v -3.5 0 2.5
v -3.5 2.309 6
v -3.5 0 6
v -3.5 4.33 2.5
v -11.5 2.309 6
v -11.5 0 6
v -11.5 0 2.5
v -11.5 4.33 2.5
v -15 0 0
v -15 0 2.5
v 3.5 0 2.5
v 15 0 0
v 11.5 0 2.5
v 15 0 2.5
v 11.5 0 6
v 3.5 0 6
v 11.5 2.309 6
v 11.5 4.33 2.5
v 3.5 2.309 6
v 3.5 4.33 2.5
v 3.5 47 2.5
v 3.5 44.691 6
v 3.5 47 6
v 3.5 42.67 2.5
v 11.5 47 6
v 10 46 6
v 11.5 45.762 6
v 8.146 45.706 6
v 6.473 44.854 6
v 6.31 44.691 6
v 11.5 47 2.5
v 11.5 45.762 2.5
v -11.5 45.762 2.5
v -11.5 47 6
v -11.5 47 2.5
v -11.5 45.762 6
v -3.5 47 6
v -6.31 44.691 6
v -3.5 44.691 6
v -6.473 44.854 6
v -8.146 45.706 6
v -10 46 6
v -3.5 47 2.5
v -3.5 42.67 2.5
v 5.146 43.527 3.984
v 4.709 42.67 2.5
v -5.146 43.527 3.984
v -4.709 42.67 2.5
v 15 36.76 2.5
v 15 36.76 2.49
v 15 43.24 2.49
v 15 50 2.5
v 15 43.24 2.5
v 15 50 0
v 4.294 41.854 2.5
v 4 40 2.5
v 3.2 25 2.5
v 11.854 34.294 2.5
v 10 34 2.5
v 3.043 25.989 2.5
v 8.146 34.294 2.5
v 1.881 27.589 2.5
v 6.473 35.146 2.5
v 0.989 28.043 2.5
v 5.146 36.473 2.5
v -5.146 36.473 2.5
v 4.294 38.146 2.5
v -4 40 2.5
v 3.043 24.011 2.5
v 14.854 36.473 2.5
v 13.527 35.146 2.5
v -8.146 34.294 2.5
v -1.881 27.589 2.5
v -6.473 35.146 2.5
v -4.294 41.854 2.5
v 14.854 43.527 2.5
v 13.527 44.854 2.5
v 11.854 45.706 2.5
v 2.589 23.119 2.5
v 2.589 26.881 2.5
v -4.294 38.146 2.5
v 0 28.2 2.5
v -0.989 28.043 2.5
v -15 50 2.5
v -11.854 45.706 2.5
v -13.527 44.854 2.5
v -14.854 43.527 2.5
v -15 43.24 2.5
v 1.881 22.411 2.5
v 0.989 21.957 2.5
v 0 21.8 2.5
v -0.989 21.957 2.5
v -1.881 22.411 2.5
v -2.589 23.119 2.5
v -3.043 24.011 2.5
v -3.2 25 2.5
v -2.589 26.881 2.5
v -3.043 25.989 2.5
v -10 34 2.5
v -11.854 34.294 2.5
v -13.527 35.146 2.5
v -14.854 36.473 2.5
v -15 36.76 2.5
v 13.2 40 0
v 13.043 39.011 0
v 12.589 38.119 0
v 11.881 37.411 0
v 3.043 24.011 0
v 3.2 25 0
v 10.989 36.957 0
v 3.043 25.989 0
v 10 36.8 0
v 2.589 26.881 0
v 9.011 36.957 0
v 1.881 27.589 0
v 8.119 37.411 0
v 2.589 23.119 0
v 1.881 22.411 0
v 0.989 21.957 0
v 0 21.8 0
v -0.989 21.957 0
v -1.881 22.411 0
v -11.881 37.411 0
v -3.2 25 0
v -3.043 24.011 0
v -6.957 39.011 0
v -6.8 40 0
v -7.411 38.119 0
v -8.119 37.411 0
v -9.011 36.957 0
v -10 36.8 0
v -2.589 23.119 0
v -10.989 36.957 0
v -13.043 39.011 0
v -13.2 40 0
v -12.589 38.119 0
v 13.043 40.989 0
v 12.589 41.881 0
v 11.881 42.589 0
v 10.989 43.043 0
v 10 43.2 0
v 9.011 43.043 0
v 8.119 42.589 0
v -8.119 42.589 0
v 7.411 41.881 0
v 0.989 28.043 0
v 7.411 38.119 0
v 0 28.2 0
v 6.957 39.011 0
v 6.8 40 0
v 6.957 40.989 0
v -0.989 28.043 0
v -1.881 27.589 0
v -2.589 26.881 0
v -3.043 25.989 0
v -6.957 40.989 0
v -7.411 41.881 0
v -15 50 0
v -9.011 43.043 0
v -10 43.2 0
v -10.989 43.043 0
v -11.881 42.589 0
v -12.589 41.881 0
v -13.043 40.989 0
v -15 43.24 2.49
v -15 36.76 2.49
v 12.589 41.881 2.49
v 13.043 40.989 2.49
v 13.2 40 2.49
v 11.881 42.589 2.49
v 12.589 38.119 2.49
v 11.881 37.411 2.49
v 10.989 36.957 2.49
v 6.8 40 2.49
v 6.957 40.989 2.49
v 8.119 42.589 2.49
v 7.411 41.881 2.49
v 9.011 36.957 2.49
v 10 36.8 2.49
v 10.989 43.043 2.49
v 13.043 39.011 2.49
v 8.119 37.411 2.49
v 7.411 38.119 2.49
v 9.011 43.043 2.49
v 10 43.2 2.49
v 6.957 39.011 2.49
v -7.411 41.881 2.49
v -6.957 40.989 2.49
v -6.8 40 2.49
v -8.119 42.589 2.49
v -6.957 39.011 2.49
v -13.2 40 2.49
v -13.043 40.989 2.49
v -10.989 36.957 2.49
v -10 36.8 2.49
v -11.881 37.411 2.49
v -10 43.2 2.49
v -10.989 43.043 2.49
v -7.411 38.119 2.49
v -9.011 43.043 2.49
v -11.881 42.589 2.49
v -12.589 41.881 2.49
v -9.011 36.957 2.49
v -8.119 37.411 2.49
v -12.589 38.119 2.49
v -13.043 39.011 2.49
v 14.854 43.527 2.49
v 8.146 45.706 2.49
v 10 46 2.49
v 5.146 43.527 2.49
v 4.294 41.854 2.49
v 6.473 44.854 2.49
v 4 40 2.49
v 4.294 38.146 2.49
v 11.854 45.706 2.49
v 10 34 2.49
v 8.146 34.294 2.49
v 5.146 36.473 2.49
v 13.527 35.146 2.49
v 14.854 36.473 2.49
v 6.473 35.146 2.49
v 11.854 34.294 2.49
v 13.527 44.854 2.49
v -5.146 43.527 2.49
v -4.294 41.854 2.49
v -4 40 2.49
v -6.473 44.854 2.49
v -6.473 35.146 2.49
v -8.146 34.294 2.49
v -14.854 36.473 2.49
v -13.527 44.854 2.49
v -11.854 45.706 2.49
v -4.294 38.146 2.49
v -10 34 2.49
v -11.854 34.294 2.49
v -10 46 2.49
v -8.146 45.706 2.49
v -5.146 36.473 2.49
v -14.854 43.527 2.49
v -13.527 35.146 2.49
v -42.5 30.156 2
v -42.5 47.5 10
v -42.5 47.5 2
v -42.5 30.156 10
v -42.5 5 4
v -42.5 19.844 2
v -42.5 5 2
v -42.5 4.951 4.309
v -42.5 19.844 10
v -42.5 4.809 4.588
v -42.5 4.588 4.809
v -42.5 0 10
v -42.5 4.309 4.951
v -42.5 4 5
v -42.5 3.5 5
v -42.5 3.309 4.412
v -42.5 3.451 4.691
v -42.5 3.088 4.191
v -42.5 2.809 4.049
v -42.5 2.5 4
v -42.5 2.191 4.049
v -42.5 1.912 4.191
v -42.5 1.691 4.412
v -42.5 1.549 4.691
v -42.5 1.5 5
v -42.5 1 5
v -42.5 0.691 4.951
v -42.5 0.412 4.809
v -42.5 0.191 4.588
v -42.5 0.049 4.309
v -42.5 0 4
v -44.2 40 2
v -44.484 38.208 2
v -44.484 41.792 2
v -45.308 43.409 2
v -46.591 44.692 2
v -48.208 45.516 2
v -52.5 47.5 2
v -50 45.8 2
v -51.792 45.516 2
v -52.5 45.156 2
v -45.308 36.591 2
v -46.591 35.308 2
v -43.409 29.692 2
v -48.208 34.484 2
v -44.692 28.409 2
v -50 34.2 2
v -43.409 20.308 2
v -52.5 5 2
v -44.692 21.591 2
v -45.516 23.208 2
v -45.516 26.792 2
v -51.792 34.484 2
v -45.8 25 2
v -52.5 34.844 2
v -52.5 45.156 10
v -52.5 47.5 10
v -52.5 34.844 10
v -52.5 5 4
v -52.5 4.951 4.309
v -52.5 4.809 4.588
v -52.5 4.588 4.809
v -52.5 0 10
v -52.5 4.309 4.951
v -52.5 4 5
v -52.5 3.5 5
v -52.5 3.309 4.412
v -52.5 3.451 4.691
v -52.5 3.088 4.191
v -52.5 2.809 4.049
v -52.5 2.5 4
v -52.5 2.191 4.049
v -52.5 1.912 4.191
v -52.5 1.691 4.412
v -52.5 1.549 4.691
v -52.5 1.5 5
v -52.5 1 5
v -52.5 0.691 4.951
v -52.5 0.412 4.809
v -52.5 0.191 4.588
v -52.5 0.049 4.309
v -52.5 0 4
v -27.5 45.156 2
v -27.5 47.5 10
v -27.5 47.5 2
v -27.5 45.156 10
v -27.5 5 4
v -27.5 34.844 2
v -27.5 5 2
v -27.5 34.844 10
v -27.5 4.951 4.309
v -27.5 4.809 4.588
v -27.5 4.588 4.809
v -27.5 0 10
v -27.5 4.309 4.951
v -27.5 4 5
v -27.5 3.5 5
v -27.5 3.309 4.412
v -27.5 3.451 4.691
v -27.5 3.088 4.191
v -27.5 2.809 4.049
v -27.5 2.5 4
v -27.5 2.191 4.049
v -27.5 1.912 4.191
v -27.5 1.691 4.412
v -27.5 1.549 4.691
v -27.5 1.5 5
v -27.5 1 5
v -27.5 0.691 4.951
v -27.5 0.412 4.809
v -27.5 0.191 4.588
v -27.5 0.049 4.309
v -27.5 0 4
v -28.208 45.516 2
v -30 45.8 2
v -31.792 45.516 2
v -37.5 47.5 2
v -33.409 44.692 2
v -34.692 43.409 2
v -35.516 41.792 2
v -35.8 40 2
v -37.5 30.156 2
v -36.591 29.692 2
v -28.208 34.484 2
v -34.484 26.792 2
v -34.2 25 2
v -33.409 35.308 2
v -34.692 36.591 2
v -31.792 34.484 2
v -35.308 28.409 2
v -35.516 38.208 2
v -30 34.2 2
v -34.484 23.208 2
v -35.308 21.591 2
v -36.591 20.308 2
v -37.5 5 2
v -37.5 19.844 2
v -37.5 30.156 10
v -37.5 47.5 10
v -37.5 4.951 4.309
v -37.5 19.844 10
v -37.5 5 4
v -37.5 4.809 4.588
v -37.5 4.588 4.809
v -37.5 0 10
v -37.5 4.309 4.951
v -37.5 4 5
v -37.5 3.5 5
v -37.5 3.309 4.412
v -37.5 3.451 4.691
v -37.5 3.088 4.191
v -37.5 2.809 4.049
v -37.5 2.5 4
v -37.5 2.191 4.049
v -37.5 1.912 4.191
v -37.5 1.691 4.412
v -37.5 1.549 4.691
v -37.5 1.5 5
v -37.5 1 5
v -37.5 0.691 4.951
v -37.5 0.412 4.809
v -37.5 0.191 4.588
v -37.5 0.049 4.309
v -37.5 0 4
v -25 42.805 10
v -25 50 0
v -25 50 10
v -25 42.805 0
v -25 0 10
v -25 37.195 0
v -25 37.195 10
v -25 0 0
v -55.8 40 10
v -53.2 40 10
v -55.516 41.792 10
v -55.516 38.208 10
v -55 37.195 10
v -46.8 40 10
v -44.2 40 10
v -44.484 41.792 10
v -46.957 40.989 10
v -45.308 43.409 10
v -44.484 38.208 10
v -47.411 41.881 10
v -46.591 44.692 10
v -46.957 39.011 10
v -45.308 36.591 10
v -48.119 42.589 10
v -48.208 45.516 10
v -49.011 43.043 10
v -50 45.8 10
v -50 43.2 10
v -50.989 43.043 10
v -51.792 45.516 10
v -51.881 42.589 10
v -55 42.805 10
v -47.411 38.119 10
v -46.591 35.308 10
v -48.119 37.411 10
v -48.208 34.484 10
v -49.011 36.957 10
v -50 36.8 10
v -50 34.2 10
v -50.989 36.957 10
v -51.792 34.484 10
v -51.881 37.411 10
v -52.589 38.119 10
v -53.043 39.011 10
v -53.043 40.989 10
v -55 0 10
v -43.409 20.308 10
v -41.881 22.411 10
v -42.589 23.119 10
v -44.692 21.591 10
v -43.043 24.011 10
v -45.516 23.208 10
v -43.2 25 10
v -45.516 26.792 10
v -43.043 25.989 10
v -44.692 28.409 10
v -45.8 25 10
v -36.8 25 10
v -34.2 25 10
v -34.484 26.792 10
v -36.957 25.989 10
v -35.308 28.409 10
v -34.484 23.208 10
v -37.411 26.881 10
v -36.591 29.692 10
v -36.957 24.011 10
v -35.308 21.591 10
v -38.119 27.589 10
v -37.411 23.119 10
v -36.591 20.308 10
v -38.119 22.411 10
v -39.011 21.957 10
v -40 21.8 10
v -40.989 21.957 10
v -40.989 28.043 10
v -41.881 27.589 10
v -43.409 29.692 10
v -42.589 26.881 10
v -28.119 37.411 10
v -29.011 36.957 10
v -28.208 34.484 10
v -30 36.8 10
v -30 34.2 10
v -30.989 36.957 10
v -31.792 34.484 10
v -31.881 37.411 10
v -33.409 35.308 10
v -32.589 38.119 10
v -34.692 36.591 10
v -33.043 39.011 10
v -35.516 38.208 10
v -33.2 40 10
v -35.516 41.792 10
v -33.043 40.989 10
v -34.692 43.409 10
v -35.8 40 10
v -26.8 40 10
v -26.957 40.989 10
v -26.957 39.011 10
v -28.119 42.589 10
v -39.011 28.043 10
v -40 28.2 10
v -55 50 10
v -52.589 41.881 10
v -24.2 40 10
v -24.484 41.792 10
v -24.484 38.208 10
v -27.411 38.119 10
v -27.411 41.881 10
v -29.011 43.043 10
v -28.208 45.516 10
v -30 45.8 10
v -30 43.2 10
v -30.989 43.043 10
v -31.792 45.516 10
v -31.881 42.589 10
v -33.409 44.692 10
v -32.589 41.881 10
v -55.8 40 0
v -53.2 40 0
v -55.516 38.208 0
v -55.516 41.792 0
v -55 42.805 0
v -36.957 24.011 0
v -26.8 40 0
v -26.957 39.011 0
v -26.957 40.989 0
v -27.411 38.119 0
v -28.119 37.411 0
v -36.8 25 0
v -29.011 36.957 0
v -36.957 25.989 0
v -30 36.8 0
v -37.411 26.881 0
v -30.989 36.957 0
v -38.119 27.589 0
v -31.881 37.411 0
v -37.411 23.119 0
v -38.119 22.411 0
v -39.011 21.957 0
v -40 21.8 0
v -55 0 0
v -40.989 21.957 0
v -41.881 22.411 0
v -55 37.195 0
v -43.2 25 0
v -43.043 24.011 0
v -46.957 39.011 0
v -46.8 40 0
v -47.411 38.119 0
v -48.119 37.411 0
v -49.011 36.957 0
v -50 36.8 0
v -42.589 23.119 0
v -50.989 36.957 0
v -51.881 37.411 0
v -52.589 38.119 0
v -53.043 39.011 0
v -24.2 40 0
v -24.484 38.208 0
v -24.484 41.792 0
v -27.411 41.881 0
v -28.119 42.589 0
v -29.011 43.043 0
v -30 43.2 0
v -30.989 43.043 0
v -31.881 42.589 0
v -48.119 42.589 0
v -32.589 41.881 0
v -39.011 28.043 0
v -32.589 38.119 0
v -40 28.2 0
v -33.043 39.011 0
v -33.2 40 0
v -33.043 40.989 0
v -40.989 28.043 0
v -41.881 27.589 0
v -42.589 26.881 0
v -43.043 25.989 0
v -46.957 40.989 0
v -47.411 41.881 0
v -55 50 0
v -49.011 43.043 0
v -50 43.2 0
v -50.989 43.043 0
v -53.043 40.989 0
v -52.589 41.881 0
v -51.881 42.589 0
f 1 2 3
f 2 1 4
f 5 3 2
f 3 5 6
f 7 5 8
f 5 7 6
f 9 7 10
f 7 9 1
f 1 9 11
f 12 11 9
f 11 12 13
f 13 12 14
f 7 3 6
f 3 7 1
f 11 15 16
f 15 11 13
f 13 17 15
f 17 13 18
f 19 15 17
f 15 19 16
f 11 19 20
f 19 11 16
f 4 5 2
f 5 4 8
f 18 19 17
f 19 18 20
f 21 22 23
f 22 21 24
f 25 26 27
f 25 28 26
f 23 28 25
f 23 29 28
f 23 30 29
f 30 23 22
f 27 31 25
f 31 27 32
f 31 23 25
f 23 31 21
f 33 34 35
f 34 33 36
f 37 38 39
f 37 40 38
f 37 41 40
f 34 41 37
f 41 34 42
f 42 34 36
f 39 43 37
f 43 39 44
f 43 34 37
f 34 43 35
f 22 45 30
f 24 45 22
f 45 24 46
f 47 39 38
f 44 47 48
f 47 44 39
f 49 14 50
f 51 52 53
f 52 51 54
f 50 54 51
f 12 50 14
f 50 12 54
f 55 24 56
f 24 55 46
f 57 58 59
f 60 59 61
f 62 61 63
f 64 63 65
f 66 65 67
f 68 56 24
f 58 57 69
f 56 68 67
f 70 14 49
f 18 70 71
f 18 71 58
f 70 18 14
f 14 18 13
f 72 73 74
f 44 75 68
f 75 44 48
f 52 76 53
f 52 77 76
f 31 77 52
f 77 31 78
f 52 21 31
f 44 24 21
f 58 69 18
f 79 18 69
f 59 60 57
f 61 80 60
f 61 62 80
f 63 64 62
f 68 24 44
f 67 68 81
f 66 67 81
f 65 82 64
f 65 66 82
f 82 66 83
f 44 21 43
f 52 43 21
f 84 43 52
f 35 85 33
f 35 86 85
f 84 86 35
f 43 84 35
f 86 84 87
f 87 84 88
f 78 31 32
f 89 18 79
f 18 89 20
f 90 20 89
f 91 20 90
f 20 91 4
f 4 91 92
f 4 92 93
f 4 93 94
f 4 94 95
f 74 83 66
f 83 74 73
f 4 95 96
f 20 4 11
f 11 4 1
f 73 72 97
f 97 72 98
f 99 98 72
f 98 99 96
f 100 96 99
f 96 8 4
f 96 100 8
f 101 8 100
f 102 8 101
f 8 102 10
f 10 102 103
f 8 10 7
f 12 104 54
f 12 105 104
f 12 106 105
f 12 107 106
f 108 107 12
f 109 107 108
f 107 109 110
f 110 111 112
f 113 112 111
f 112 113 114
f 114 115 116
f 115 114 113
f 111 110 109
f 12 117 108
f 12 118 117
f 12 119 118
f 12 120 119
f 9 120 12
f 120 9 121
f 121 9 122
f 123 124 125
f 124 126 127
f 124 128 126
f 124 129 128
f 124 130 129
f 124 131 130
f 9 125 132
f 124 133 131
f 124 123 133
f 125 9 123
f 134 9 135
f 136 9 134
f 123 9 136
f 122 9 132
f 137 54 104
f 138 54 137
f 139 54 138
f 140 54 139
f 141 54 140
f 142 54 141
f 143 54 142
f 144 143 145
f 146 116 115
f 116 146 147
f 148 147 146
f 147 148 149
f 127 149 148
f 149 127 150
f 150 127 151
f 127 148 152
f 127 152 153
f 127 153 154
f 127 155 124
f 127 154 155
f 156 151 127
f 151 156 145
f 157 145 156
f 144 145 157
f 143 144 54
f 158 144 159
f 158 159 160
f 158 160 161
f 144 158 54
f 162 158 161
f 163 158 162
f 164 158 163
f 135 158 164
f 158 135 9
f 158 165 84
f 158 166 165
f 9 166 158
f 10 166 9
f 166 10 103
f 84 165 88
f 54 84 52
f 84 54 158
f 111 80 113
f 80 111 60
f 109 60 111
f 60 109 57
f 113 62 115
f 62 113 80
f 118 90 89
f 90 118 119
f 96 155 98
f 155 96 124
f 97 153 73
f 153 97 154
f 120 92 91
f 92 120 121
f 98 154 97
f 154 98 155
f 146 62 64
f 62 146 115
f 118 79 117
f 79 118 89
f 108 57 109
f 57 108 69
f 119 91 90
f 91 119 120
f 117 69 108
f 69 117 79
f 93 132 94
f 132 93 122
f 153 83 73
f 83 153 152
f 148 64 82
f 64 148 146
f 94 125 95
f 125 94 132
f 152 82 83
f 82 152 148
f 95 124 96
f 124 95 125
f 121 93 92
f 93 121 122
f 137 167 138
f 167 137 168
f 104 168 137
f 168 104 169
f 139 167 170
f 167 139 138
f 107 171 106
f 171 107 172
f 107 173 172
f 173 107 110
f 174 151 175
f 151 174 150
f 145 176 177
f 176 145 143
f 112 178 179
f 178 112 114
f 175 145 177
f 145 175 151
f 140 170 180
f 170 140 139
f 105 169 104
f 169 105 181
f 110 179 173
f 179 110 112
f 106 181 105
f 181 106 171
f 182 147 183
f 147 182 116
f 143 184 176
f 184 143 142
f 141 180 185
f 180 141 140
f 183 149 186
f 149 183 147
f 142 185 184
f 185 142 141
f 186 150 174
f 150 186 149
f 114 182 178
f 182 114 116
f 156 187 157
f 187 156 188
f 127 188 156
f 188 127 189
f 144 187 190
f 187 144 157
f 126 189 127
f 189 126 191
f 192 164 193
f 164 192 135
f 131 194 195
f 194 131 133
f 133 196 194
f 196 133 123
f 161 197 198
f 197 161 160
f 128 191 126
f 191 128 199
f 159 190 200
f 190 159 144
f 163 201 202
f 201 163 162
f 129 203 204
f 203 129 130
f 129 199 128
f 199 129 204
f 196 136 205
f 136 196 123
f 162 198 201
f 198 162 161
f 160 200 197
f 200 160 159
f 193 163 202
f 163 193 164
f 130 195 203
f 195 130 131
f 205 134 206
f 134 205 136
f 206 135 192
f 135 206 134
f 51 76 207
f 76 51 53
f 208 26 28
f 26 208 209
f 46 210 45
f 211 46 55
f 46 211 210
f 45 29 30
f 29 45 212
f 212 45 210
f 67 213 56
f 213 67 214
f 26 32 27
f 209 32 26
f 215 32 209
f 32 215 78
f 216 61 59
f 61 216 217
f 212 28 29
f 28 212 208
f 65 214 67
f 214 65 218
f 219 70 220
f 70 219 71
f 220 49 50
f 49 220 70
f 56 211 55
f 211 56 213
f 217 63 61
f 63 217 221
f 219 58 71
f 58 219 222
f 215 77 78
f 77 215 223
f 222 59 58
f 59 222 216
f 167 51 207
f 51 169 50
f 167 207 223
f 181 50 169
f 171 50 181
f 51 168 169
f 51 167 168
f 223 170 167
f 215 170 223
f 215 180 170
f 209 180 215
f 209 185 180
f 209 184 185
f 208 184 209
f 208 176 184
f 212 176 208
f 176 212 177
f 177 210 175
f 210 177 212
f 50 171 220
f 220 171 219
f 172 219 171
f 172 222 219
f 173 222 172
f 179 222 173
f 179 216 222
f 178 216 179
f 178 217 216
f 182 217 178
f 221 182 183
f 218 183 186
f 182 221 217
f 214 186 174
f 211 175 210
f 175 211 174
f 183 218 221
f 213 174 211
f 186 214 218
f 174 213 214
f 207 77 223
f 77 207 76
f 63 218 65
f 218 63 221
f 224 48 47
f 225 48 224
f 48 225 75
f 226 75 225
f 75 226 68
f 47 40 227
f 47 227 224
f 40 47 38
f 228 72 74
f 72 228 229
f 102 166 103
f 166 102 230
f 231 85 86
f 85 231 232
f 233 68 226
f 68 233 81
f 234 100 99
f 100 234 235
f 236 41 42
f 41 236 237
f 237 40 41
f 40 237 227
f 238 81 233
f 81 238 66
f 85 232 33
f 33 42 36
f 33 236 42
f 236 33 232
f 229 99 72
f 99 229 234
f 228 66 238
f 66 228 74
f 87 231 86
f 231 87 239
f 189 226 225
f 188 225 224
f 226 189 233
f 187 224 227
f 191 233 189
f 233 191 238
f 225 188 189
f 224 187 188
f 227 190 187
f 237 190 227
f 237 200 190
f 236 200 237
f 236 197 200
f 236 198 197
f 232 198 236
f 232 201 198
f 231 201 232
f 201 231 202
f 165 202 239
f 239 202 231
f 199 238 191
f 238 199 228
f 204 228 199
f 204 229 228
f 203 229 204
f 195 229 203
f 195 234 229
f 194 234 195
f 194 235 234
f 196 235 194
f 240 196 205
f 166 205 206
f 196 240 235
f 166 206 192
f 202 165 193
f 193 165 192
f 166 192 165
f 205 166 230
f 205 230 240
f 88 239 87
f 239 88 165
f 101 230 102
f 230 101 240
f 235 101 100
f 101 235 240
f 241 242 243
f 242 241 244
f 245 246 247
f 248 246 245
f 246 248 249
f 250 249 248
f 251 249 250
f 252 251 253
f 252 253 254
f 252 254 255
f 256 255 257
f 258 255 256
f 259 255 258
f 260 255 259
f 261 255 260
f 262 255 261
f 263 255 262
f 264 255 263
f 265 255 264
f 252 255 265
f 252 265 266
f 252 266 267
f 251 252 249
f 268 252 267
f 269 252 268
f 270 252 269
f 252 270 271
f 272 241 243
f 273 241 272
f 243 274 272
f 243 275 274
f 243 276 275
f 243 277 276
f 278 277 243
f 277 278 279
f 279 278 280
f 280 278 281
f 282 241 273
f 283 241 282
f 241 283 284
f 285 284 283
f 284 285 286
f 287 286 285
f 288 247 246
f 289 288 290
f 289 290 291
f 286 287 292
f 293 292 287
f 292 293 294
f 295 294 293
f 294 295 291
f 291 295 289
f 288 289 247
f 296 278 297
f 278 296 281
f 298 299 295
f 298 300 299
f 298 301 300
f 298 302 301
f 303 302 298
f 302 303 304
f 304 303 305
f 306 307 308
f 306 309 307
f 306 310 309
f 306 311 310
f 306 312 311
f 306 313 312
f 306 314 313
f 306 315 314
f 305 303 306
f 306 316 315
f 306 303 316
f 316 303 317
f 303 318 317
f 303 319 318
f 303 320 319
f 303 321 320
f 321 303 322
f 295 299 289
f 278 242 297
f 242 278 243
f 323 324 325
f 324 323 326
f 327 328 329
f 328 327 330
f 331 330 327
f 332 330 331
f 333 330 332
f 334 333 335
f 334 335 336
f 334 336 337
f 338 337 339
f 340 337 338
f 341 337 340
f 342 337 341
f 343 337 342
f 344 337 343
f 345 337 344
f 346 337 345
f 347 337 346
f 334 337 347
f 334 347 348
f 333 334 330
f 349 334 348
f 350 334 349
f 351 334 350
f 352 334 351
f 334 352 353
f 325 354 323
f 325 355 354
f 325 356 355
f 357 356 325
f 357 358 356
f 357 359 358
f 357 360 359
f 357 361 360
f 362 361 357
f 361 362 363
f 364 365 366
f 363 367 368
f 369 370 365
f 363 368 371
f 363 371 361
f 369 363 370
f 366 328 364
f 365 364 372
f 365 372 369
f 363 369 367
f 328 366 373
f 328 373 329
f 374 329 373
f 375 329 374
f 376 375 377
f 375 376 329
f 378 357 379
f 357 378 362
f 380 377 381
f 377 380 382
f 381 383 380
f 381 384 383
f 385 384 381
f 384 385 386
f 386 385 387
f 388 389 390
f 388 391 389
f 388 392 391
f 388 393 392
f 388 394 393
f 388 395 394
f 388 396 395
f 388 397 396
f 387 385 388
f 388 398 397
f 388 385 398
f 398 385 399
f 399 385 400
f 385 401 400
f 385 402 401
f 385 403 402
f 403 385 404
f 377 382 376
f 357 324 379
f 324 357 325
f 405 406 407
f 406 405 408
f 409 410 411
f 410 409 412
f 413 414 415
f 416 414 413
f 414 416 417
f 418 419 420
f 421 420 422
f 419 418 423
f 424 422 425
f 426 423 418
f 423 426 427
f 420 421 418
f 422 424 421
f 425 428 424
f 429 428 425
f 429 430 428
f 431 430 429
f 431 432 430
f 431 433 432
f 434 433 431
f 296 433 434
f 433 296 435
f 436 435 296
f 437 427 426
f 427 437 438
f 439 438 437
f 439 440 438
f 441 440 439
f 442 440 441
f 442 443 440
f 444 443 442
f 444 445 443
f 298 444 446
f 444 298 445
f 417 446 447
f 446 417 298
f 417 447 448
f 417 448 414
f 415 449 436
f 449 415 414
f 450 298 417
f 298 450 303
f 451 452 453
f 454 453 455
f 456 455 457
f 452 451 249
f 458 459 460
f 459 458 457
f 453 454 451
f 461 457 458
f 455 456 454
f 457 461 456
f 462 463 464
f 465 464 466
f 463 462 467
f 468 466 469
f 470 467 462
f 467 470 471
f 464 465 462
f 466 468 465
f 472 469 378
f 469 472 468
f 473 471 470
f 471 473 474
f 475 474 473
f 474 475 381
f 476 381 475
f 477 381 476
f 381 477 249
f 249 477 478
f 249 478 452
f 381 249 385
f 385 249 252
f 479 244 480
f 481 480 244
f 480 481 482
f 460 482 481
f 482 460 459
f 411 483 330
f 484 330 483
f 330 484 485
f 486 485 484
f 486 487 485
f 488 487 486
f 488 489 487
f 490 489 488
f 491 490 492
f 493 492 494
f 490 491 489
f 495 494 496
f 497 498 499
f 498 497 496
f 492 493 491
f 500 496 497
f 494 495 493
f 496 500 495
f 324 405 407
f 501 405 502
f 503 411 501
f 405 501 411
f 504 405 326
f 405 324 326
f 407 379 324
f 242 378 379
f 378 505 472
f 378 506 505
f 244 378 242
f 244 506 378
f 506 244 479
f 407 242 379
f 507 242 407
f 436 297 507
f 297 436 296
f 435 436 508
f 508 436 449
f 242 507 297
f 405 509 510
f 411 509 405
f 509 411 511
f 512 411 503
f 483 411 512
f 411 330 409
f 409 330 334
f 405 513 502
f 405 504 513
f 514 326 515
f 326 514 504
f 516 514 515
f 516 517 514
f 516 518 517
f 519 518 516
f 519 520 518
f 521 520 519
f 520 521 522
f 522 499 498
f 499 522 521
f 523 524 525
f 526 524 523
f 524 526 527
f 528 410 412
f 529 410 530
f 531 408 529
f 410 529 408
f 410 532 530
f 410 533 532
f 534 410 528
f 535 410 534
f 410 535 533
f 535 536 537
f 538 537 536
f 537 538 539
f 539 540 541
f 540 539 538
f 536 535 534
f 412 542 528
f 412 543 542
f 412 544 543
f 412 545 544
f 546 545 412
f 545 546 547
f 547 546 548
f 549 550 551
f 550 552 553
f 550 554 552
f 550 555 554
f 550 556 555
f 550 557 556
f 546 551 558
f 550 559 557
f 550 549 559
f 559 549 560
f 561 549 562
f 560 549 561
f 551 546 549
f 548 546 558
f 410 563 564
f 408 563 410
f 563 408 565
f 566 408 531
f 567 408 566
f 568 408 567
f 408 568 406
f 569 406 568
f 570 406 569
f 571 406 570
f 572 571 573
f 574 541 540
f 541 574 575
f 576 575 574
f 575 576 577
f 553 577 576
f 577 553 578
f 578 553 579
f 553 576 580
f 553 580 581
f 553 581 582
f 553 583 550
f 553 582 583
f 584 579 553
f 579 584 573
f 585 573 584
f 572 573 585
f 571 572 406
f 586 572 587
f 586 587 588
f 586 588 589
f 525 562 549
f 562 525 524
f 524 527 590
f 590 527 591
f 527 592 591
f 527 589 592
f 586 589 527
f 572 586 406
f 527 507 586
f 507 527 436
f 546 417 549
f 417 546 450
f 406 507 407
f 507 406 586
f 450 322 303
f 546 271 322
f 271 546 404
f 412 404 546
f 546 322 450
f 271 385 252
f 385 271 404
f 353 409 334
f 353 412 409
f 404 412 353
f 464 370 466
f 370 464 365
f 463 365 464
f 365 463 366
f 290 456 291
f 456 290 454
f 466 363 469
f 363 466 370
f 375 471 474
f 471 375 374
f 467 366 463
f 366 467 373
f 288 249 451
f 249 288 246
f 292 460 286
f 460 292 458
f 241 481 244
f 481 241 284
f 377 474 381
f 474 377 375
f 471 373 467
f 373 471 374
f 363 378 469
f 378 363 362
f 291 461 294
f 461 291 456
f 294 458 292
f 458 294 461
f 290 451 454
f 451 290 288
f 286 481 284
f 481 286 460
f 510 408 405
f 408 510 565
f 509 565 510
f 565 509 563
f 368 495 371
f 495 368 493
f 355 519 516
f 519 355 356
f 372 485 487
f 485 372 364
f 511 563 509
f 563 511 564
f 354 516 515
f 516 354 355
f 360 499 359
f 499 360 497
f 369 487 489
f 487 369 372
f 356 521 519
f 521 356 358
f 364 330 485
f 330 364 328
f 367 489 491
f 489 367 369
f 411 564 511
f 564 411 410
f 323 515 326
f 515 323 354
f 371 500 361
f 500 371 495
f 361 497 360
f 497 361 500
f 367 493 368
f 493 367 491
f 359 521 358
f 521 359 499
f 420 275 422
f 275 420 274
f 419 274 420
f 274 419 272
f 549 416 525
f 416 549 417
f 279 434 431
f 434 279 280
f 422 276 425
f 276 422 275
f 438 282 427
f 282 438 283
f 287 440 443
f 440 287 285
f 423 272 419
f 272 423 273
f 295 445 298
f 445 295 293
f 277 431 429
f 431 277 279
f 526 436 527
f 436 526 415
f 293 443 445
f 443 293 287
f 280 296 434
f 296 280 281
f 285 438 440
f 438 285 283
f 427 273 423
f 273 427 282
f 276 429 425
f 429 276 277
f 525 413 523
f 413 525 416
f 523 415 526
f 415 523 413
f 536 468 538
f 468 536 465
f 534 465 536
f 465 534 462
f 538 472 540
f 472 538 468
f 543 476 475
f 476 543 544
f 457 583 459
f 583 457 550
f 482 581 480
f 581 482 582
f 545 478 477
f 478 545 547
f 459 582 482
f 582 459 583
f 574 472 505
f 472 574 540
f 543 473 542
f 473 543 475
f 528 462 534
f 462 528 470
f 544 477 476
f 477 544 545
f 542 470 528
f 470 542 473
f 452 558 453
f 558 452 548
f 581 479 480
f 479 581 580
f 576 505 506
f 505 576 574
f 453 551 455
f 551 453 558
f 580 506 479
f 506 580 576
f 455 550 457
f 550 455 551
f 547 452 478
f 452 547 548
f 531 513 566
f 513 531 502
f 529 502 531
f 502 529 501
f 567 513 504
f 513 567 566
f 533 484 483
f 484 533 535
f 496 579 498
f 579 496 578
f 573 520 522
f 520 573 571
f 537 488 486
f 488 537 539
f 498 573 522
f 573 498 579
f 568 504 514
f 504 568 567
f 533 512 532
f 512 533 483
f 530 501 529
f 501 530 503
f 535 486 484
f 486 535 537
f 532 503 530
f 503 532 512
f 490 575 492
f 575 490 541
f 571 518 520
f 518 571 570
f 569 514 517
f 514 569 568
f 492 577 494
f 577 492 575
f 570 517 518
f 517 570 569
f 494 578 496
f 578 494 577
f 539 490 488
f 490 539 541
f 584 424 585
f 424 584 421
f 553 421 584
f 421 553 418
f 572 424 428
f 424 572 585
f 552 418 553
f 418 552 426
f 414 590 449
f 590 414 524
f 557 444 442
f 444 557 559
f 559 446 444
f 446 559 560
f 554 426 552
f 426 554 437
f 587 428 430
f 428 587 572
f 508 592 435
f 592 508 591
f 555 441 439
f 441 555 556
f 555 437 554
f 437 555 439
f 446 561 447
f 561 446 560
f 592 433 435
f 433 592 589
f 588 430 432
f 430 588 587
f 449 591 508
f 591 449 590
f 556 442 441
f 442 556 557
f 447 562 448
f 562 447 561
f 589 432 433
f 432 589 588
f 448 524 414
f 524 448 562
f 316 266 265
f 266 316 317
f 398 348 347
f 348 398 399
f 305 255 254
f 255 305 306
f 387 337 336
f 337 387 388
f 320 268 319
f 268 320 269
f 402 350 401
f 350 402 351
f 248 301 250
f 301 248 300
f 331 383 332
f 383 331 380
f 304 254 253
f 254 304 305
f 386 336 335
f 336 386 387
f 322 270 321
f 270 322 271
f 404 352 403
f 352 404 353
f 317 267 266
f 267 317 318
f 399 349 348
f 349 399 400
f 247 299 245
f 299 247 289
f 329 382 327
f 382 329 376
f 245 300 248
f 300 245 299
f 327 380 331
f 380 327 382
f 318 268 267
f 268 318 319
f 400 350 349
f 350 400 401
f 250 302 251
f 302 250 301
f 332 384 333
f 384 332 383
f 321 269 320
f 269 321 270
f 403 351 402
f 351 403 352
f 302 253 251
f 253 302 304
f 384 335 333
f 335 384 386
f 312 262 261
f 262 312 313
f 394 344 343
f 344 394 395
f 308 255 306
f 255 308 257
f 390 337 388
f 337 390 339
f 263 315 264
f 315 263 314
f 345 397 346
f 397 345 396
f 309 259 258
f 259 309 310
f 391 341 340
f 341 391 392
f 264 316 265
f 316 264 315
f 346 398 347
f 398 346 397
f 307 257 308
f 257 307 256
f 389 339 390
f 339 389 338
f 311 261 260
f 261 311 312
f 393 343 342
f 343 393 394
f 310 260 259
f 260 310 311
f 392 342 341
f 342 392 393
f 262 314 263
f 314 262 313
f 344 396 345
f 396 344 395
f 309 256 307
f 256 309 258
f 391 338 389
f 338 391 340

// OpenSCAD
difference(){
    union(){
        translate([-15,0,0]) cube([30,50,2.5]);
        difference(){
            union(){
                translate([-11.5,0,2]) cube([8,50,4]);
                translate([3.5,0,2]) cube([8,50,4]);
            }
            
            translate([0,0,10]) rotate([-60,0,0]) translate([-50,0,0]) cube([100,100,100]);
        }
        translate([0,47,0]) rotate([0,0,180]) difference(){
            union(){
                translate([-11.5,0,2]) cube([8,50,4]);
                translate([3.5,0,2]) cube([8,50,4]);
            }
            
            translate([0,0,10]) rotate([-60,0,0]) translate([-50,0,0]) cube([100,100,100]);
        }   
    }
    translate([0,25,-1]) cylinder(h=20,r=3.2,$fn=20);
    translate([10,40,-1]) cylinder(h=20,r=3.2,$fn=20);
    translate([-10,40,-1]) cylinder(h=20,r=3.2,$fn=20);
    translate([10,40,2.49]) cylinder(h=10,r=6,$fn=20);
    translate([-10,40,2.49]) cylinder(h=10,r=6,$fn=20);
}

translate([-40,0,0]) union(){
    difference(){
        union(){
            difference(){
                translate([-15,0,0]) cube([30,50,10]);
                union(){
                    translate([-12.5,-2.5,2]) cube([10,50,10]);
                    translate([2.5,-2.5,2]) cube([10,50,10]);
                }
            }
            translate([0,25,0]) cylinder(h=10,r=5.8,$fn=20);
            translate([10,40,0]) cylinder(h=10,r=5.8,$fn=20);
            translate([-10,40,0]) cylinder(h=10,r=5.8,$fn=20);
        }
        translate([0,25,-1]) cylinder(h=20,r=3.2,$fn=20);
        translate([10,40,-1]) cylinder(h=20,r=3.2,$fn=20);
        translate([-10,40,-1]) cylinder(h=20,r=3.2,$fn=20);
    }
    translate([15,1,4]) rotate([0,-90,0])
        difference(){
            hull(){
                translate([0,3,0]) cylinder(h=30,r=1,$fn=20);
                cylinder(h=30,r=1,$fn=20);
                translate([-3,-1,0]) cube([2,5,30]);
            }
            translate([1,1.5,-1]) cylinder(h=32,r=1,$fn=20);
            
        }
}
